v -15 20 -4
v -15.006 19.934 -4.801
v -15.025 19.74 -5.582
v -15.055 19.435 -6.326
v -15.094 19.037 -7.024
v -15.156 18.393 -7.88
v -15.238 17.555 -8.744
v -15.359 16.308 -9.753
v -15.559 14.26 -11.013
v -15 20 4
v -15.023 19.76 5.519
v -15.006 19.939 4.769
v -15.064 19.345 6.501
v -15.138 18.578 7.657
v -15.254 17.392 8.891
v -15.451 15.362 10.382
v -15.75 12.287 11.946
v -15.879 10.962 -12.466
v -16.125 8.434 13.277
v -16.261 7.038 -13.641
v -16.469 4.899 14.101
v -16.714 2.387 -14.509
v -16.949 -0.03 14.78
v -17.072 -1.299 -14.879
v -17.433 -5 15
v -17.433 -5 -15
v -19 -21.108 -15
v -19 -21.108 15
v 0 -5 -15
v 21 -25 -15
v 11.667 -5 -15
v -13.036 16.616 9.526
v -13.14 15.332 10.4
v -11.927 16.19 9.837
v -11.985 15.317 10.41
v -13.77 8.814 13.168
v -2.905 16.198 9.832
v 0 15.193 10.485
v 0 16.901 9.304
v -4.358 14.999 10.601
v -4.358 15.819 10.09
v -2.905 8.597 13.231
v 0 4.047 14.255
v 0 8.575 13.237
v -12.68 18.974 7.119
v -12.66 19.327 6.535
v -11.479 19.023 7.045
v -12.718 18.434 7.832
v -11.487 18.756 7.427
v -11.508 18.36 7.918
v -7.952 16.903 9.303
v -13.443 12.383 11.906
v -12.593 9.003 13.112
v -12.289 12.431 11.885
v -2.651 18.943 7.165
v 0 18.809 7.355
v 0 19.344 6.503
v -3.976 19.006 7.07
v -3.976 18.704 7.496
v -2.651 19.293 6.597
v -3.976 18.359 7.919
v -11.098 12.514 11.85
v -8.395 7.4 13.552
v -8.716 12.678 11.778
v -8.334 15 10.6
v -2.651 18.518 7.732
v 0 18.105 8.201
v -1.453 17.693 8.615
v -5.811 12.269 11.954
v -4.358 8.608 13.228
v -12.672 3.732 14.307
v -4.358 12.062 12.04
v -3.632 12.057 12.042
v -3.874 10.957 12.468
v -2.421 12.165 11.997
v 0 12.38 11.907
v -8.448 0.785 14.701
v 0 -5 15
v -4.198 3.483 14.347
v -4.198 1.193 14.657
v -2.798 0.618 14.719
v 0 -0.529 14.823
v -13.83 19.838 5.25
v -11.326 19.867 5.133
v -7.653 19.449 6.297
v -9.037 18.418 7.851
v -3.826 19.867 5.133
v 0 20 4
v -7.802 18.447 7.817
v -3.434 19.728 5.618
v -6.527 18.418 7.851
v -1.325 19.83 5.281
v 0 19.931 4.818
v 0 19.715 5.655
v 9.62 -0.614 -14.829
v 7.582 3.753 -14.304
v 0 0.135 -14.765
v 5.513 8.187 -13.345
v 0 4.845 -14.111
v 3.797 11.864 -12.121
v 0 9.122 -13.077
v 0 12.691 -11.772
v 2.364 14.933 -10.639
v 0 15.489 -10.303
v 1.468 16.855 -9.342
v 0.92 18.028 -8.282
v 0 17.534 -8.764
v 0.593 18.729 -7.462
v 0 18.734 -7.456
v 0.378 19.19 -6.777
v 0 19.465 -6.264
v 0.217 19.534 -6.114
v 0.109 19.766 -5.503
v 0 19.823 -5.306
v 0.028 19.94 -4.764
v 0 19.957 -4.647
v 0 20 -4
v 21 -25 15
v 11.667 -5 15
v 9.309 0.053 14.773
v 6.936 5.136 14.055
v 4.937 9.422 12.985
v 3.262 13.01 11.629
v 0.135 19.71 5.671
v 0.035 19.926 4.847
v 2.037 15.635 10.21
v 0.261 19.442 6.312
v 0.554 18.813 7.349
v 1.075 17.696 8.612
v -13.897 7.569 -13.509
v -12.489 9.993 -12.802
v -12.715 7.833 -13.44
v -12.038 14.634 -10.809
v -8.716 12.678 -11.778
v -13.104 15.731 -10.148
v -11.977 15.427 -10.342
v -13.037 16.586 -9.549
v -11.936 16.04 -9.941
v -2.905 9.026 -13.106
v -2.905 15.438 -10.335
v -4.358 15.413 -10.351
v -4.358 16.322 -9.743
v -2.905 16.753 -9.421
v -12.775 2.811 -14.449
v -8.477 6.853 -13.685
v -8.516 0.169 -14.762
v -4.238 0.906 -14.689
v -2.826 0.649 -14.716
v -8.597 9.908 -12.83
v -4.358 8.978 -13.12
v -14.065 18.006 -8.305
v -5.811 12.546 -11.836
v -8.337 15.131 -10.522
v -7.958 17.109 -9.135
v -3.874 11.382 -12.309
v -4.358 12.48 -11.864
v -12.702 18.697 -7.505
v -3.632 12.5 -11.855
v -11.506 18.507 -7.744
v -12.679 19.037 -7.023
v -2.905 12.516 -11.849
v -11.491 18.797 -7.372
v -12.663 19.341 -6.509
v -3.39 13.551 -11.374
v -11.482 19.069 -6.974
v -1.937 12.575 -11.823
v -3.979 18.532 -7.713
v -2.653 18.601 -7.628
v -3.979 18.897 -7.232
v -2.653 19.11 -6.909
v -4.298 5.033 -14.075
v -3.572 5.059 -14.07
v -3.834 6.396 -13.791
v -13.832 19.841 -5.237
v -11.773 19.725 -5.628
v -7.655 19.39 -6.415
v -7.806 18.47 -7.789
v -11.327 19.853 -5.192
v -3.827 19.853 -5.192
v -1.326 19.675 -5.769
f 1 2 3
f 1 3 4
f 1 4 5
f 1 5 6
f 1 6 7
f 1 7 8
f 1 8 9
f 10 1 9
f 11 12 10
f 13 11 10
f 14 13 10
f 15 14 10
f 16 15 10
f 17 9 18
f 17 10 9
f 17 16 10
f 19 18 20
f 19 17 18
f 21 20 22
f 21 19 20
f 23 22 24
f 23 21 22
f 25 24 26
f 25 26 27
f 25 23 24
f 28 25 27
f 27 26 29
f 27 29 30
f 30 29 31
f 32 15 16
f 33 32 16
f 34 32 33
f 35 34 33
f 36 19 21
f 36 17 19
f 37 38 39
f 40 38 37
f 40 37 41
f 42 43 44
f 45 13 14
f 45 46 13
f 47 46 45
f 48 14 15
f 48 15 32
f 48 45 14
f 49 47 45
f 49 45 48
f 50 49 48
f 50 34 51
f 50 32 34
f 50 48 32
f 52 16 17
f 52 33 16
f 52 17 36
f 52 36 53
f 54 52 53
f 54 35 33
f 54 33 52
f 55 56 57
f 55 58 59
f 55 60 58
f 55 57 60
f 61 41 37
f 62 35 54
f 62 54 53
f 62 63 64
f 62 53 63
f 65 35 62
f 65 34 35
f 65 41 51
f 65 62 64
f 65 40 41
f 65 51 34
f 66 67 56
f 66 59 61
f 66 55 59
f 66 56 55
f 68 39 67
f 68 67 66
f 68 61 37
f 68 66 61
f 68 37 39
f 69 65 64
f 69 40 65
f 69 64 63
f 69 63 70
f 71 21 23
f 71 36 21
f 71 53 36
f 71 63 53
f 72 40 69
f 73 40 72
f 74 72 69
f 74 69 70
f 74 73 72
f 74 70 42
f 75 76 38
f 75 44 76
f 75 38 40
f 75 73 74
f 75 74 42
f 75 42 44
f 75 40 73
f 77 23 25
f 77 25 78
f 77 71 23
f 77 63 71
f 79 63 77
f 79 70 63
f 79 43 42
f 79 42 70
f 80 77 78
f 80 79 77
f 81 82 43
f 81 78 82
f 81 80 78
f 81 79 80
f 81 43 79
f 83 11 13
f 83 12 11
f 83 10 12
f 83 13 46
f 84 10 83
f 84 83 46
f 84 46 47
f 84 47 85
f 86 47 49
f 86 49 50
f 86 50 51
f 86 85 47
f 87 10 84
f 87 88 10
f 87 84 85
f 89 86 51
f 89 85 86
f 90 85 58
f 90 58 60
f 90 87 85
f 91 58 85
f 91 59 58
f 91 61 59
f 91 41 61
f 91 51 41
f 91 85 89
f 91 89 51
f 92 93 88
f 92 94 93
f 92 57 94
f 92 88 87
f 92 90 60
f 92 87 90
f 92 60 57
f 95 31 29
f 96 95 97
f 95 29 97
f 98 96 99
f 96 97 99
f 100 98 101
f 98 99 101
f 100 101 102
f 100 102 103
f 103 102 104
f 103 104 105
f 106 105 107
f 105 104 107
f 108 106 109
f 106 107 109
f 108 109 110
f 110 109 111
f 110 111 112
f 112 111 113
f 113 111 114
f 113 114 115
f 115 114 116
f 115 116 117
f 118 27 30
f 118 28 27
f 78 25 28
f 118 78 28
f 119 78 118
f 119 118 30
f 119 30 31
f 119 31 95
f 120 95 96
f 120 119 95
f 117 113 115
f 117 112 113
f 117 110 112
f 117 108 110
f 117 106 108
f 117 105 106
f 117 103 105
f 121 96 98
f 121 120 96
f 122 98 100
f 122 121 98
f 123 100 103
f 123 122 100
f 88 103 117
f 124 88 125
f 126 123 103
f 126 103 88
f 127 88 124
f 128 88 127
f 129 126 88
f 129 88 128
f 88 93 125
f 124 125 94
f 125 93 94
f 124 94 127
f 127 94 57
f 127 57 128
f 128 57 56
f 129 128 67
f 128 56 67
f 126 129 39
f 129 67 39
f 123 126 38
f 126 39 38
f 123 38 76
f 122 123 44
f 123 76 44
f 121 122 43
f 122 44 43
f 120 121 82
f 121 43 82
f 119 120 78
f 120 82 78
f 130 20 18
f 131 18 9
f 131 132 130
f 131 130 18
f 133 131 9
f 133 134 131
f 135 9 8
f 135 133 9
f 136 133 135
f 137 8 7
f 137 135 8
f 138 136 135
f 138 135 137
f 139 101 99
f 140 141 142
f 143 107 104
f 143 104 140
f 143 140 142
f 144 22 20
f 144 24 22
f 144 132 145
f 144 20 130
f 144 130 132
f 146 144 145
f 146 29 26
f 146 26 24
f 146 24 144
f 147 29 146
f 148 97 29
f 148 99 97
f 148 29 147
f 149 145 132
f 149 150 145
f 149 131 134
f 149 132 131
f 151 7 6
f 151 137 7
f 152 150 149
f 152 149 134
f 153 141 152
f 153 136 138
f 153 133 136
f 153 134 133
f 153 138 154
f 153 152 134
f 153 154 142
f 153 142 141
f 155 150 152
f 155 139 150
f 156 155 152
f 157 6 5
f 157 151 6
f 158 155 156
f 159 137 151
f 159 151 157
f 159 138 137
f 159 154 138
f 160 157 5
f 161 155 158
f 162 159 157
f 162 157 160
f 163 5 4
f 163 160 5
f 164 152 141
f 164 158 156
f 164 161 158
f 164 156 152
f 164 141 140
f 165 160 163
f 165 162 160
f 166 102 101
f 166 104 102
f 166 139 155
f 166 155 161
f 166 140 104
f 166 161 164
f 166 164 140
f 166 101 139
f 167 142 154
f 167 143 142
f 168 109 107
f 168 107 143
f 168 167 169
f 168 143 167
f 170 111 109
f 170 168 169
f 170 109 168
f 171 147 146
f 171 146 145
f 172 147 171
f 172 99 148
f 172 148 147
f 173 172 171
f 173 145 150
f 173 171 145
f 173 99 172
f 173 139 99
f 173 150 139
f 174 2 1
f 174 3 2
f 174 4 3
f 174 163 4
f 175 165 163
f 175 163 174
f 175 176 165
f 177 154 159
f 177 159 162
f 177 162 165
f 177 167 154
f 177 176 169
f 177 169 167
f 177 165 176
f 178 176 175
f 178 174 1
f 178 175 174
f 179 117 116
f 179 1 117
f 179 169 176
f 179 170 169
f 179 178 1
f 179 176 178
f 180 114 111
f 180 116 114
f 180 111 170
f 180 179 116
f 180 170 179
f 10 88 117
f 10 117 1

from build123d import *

# Parameters (mm, degrees)
F1_DEPTH      = 15
F1_DEPTH_BACK = 15
F3_DEPTH      = 19.001
F3_DEPTH_BACK = 21.001


with BuildPart() as f1:
    # F0 (on Top) → F1 (new body, two sides)
    with BuildSketch(Plane.XY) as f1_sk:
        Polygon((21, -25), (0, 20), (-15, 20), (-19, -21.1077940659), align=None)
    extrude(amount=F1_DEPTH)
    extrude(f1_sk.sketch, amount=-F1_DEPTH_BACK)

    # F2 (on Right) → F3 (cut, two sides)
    with BuildSketch(Plane.YZ) as f3_sk:
        with BuildLine():
            add(Edge.make_bspline(
                [(20, 4), (20, 15), (-5, 15)],
                knots=[0, 0, 0, 1.5707963268, 1.5707963268, 1.5707963268], degree=2, weights=[1, 0.7071067812, 1]))
            Line((20, 4), (20, 15))
            Line((20, 15), (-5, 15))
        make_face()
        with BuildLine():
            add(Edge.make_bspline(
                [(-5, -15), (20, -15), (20, -4)],
                knots=[4.7123889804, 4.7123889804, 4.7123889804, 6.2831853072, 6.2831853072, 6.2831853072], degree=2, weights=[1, 0.7071067812, 1]))
            Line((-5, -15), (20, -15))
            Line((20, -15), (20, -4))
        make_face()
    extrude(amount=-F3_DEPTH, mode=Mode.SUBTRACT)
    extrude(f3_sk.sketch, amount=F3_DEPTH_BACK, mode=Mode.SUBTRACT)


solid = f1.part
